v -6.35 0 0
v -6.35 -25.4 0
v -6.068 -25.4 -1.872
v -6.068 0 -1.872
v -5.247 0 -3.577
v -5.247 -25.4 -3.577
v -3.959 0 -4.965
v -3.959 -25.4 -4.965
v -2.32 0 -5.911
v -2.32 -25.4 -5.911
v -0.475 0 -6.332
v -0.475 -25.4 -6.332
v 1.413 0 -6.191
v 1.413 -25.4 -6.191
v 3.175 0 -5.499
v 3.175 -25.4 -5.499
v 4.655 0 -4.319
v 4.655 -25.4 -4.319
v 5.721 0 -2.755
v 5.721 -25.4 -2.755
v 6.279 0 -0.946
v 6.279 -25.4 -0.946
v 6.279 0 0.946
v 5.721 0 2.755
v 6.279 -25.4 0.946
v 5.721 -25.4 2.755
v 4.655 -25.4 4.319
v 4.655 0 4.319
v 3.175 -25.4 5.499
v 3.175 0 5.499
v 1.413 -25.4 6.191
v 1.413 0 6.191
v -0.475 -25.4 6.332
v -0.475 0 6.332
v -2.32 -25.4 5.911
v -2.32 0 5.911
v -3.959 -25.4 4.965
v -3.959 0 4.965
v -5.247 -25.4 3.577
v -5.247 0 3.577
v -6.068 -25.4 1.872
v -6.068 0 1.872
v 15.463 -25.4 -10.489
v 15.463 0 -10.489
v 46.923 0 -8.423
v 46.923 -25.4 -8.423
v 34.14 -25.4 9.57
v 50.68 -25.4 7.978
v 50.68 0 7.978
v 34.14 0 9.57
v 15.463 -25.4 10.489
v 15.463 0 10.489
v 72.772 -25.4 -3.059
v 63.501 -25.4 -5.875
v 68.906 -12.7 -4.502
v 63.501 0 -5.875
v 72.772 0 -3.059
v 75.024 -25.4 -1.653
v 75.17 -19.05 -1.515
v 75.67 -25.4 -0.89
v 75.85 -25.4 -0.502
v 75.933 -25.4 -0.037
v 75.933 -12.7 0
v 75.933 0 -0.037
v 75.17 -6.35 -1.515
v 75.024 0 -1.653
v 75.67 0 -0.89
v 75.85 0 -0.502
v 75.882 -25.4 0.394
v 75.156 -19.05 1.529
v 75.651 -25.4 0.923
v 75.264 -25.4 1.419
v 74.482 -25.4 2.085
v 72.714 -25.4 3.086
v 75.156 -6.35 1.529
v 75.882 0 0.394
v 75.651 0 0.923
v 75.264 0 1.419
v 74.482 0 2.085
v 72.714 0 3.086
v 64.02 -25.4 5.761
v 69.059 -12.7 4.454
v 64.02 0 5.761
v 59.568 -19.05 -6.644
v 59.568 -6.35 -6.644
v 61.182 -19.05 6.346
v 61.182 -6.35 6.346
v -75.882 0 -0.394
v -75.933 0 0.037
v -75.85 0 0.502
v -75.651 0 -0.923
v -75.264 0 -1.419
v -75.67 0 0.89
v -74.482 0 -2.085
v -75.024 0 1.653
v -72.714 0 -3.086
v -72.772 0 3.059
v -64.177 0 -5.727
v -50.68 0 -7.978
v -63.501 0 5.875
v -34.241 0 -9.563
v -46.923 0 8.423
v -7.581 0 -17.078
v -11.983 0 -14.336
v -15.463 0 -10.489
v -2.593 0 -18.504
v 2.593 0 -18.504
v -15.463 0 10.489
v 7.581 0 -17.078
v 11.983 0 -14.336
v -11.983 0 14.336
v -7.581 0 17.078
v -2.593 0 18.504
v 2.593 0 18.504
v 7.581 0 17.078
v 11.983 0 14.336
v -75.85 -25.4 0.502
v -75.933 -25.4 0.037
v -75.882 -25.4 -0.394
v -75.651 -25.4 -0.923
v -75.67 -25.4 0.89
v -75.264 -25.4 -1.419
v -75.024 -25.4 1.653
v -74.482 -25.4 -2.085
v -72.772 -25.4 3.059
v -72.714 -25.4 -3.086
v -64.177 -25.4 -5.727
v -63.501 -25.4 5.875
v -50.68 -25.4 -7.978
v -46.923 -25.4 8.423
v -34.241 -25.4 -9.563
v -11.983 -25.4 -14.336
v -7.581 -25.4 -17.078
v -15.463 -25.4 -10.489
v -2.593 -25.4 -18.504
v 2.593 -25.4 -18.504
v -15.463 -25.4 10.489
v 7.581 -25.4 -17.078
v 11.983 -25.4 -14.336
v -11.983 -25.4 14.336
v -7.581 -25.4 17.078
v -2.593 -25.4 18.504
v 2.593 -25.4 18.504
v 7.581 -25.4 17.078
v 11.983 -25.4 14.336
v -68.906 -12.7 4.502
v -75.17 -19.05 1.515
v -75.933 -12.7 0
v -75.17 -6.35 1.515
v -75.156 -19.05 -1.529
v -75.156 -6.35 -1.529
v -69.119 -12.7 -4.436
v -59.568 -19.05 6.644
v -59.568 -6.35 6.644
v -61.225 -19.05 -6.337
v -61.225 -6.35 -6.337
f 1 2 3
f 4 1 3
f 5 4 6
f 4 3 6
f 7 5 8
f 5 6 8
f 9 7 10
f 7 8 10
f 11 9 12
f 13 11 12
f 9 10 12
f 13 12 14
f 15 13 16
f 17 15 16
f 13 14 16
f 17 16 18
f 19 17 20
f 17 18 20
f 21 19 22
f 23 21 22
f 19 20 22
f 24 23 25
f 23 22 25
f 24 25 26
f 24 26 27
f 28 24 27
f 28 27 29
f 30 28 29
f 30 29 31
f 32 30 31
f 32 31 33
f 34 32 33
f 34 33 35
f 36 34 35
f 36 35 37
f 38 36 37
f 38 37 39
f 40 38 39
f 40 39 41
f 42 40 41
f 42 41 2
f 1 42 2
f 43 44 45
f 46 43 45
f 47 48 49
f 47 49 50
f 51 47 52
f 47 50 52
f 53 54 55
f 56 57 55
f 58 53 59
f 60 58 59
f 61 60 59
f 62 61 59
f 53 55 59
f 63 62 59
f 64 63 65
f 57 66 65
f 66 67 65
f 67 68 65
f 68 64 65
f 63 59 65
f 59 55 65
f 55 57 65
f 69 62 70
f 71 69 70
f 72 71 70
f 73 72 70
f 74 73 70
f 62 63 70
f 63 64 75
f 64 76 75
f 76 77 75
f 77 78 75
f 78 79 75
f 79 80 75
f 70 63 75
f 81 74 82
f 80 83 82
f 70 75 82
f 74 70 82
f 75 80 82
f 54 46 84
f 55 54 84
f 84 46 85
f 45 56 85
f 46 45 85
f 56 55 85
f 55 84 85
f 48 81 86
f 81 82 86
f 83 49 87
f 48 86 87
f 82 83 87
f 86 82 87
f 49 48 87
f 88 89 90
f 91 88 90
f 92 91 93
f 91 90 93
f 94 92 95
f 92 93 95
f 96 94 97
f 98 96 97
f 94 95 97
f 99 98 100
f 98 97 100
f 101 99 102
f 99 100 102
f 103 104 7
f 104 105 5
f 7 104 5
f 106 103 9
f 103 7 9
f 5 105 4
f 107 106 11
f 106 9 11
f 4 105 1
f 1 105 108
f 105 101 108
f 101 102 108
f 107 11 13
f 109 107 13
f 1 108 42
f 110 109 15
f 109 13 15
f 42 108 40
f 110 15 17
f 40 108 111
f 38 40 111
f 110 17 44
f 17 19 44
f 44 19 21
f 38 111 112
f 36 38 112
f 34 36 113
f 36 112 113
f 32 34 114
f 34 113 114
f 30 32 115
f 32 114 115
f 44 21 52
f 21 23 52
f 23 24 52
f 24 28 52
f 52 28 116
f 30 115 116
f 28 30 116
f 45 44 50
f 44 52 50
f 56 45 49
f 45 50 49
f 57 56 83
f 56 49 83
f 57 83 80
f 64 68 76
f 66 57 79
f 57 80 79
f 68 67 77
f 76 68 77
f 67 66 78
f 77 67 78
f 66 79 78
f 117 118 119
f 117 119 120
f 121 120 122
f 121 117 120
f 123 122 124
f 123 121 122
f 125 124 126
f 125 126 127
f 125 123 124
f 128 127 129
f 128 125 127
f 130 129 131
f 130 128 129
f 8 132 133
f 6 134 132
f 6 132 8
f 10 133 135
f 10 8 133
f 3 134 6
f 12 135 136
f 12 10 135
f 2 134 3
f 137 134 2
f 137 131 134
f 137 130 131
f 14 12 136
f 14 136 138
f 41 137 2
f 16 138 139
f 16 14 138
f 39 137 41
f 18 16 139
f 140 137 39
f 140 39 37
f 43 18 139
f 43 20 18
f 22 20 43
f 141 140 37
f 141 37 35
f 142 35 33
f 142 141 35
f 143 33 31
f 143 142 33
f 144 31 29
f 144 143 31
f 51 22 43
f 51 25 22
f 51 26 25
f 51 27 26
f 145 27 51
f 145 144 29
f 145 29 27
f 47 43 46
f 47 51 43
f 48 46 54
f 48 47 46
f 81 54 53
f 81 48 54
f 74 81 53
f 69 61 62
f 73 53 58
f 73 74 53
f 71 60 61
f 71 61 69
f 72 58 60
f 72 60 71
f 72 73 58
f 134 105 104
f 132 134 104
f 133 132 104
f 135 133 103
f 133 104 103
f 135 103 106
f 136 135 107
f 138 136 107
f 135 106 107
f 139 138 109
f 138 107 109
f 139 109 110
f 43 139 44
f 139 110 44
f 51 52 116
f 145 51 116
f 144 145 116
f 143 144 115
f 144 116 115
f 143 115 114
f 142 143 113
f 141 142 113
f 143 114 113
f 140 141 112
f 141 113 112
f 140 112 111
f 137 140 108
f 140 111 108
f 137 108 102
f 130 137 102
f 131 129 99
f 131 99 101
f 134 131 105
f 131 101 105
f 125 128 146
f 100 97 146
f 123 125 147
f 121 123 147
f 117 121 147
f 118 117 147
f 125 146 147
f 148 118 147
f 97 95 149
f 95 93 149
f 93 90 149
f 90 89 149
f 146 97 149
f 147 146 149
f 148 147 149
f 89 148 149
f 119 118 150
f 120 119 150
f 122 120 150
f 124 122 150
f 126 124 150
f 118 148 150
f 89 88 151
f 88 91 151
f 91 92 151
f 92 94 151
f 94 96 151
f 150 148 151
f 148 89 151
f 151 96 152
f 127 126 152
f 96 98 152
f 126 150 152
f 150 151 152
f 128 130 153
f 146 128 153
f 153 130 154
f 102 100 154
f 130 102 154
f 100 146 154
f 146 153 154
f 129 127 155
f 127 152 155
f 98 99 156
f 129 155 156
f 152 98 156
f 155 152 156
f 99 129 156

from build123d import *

# Parameters (mm, degrees)
F1_DEPTH = 25.4
F2_D     = 12.7


with BuildPart() as f1:
    # F0 (on Front) → F1 (new body)
    with BuildSketch(Plane.XZ):
        with BuildLine():
            ThreePointArc((15.4629041106, -10.4894333364), (17.8613288985, -5.4865786456), (18.6850104429, 0))
            ThreePointArc((18.6850104429, 0), (17.8613288985, 5.4865786456), (15.4629041106, 10.4894333364))
            add(Edge.make_bspline(
                [(15.4629041106, 10.4894333364), (0, 10.9432349415), (-15.4629041106, 10.4894333364)],
                knots=[4.5073159881, 4.5073159881, 4.5073159881, 4.9174619727, 4.9174619727, 4.9174619727], degree=2, weights=[1, 0.9790461231, 1]))
            ThreePointArc((-15.4629041106, 10.4894333364), (-18.6850104429, 0), (-15.4629041106, -10.4894333364))
            add(Edge.make_bspline(
                [(-15.4629041106, -10.4894333364), (0, -10.9432349415), (15.4629041106, -10.4894333364)],
                knots=[1.3657233345, 1.3657233345, 1.3657233345, 1.7758693191, 1.7758693191, 1.7758693191], degree=2, weights=[1, 0.9790461231, 1]))
        make_face()
        with BuildLine():
            ThreePointArc((15.4629041106, 10.4894333364), (17.8613288985, 5.4865786456), (18.6850104429, 0))
            ThreePointArc((18.6850104429, 0), (17.8613288985, -5.4865786456), (15.4629041106, -10.4894333364))
            add(Edge.make_bspline(
                [(15.4629041106, -10.4894333364), (75.9330615401, -8.7147696442), (75.9330615401, 0), (75.9330615401, 8.7147696442), (15.4629041106, 10.4894333364)],
                knots=[1.7758693191, 1.7758693191, 1.7758693191, 3.1415926536, 3.1415926536, 4.5073159881, 4.5073159881, 4.5073159881], degree=2, weights=[1, 0.775770141, 1, 0.775770141, 1]))
        make_face()
        with BuildLine():
            add(Edge.make_bspline(
                [(15.4629041106, 10.4894333364), (0, 10.9432349415), (-15.4629041106, 10.4894333364)],
                knots=[4.5073159881, 4.5073159881, 4.5073159881, 4.9174619727, 4.9174619727, 4.9174619727], degree=2, weights=[1, 0.9790461231, 1]))
            ThreePointArc((15.4629041106, 10.4894333364), (0, 18.6850104429), (-15.4629041106, 10.4894333364))
        make_face()
        with BuildLine():
            ThreePointArc((-15.4629041106, -10.4894333364), (0, -18.6850104429), (15.4629041106, -10.4894333364))
            add(Edge.make_bspline(
                [(-15.4629041106, -10.4894333364), (0, -10.9432349415), (15.4629041106, -10.4894333364)],
                knots=[1.3657233345, 1.3657233345, 1.3657233345, 1.7758693191, 1.7758693191, 1.7758693191], degree=2, weights=[1, 0.9790461231, 1]))
        make_face()
        with BuildLine():
            ThreePointArc((-15.4629041106, -10.4894333364), (-18.6850104429, 0), (-15.4629041106, 10.4894333364))
            add(Edge.make_bspline(
                [(-15.4629041106, 10.4894333364), (-75.9330615401, 8.7147696442), (-75.9330615401, 0)],
                knots=[4.9174619727, 4.9174619727, 4.9174619727, 6.2831853072, 6.2831853072, 6.2831853072], degree=2, weights=[1, 0.775770141, 1]))
            add(Edge.make_bspline(
                [(-75.9330615401, 0), (-75.9330615401, -8.7147696442), (-15.4629041106, -10.4894333364)],
                knots=[0, 0, 0, 1.3657233345, 1.3657233345, 1.3657233345], degree=2, weights=[1, 0.775770141, 1]))
        make_face()
    extrude(amount=F1_DEPTH)

    # F2 (through all)
    with Locations(Plane(origin=(0, 0, 0), x_dir=(1, 0, 0), z_dir=(0, 1, 0))):
        with Locations((0, 0)):
            Hole(F2_D / 2)


solid = f1.part
